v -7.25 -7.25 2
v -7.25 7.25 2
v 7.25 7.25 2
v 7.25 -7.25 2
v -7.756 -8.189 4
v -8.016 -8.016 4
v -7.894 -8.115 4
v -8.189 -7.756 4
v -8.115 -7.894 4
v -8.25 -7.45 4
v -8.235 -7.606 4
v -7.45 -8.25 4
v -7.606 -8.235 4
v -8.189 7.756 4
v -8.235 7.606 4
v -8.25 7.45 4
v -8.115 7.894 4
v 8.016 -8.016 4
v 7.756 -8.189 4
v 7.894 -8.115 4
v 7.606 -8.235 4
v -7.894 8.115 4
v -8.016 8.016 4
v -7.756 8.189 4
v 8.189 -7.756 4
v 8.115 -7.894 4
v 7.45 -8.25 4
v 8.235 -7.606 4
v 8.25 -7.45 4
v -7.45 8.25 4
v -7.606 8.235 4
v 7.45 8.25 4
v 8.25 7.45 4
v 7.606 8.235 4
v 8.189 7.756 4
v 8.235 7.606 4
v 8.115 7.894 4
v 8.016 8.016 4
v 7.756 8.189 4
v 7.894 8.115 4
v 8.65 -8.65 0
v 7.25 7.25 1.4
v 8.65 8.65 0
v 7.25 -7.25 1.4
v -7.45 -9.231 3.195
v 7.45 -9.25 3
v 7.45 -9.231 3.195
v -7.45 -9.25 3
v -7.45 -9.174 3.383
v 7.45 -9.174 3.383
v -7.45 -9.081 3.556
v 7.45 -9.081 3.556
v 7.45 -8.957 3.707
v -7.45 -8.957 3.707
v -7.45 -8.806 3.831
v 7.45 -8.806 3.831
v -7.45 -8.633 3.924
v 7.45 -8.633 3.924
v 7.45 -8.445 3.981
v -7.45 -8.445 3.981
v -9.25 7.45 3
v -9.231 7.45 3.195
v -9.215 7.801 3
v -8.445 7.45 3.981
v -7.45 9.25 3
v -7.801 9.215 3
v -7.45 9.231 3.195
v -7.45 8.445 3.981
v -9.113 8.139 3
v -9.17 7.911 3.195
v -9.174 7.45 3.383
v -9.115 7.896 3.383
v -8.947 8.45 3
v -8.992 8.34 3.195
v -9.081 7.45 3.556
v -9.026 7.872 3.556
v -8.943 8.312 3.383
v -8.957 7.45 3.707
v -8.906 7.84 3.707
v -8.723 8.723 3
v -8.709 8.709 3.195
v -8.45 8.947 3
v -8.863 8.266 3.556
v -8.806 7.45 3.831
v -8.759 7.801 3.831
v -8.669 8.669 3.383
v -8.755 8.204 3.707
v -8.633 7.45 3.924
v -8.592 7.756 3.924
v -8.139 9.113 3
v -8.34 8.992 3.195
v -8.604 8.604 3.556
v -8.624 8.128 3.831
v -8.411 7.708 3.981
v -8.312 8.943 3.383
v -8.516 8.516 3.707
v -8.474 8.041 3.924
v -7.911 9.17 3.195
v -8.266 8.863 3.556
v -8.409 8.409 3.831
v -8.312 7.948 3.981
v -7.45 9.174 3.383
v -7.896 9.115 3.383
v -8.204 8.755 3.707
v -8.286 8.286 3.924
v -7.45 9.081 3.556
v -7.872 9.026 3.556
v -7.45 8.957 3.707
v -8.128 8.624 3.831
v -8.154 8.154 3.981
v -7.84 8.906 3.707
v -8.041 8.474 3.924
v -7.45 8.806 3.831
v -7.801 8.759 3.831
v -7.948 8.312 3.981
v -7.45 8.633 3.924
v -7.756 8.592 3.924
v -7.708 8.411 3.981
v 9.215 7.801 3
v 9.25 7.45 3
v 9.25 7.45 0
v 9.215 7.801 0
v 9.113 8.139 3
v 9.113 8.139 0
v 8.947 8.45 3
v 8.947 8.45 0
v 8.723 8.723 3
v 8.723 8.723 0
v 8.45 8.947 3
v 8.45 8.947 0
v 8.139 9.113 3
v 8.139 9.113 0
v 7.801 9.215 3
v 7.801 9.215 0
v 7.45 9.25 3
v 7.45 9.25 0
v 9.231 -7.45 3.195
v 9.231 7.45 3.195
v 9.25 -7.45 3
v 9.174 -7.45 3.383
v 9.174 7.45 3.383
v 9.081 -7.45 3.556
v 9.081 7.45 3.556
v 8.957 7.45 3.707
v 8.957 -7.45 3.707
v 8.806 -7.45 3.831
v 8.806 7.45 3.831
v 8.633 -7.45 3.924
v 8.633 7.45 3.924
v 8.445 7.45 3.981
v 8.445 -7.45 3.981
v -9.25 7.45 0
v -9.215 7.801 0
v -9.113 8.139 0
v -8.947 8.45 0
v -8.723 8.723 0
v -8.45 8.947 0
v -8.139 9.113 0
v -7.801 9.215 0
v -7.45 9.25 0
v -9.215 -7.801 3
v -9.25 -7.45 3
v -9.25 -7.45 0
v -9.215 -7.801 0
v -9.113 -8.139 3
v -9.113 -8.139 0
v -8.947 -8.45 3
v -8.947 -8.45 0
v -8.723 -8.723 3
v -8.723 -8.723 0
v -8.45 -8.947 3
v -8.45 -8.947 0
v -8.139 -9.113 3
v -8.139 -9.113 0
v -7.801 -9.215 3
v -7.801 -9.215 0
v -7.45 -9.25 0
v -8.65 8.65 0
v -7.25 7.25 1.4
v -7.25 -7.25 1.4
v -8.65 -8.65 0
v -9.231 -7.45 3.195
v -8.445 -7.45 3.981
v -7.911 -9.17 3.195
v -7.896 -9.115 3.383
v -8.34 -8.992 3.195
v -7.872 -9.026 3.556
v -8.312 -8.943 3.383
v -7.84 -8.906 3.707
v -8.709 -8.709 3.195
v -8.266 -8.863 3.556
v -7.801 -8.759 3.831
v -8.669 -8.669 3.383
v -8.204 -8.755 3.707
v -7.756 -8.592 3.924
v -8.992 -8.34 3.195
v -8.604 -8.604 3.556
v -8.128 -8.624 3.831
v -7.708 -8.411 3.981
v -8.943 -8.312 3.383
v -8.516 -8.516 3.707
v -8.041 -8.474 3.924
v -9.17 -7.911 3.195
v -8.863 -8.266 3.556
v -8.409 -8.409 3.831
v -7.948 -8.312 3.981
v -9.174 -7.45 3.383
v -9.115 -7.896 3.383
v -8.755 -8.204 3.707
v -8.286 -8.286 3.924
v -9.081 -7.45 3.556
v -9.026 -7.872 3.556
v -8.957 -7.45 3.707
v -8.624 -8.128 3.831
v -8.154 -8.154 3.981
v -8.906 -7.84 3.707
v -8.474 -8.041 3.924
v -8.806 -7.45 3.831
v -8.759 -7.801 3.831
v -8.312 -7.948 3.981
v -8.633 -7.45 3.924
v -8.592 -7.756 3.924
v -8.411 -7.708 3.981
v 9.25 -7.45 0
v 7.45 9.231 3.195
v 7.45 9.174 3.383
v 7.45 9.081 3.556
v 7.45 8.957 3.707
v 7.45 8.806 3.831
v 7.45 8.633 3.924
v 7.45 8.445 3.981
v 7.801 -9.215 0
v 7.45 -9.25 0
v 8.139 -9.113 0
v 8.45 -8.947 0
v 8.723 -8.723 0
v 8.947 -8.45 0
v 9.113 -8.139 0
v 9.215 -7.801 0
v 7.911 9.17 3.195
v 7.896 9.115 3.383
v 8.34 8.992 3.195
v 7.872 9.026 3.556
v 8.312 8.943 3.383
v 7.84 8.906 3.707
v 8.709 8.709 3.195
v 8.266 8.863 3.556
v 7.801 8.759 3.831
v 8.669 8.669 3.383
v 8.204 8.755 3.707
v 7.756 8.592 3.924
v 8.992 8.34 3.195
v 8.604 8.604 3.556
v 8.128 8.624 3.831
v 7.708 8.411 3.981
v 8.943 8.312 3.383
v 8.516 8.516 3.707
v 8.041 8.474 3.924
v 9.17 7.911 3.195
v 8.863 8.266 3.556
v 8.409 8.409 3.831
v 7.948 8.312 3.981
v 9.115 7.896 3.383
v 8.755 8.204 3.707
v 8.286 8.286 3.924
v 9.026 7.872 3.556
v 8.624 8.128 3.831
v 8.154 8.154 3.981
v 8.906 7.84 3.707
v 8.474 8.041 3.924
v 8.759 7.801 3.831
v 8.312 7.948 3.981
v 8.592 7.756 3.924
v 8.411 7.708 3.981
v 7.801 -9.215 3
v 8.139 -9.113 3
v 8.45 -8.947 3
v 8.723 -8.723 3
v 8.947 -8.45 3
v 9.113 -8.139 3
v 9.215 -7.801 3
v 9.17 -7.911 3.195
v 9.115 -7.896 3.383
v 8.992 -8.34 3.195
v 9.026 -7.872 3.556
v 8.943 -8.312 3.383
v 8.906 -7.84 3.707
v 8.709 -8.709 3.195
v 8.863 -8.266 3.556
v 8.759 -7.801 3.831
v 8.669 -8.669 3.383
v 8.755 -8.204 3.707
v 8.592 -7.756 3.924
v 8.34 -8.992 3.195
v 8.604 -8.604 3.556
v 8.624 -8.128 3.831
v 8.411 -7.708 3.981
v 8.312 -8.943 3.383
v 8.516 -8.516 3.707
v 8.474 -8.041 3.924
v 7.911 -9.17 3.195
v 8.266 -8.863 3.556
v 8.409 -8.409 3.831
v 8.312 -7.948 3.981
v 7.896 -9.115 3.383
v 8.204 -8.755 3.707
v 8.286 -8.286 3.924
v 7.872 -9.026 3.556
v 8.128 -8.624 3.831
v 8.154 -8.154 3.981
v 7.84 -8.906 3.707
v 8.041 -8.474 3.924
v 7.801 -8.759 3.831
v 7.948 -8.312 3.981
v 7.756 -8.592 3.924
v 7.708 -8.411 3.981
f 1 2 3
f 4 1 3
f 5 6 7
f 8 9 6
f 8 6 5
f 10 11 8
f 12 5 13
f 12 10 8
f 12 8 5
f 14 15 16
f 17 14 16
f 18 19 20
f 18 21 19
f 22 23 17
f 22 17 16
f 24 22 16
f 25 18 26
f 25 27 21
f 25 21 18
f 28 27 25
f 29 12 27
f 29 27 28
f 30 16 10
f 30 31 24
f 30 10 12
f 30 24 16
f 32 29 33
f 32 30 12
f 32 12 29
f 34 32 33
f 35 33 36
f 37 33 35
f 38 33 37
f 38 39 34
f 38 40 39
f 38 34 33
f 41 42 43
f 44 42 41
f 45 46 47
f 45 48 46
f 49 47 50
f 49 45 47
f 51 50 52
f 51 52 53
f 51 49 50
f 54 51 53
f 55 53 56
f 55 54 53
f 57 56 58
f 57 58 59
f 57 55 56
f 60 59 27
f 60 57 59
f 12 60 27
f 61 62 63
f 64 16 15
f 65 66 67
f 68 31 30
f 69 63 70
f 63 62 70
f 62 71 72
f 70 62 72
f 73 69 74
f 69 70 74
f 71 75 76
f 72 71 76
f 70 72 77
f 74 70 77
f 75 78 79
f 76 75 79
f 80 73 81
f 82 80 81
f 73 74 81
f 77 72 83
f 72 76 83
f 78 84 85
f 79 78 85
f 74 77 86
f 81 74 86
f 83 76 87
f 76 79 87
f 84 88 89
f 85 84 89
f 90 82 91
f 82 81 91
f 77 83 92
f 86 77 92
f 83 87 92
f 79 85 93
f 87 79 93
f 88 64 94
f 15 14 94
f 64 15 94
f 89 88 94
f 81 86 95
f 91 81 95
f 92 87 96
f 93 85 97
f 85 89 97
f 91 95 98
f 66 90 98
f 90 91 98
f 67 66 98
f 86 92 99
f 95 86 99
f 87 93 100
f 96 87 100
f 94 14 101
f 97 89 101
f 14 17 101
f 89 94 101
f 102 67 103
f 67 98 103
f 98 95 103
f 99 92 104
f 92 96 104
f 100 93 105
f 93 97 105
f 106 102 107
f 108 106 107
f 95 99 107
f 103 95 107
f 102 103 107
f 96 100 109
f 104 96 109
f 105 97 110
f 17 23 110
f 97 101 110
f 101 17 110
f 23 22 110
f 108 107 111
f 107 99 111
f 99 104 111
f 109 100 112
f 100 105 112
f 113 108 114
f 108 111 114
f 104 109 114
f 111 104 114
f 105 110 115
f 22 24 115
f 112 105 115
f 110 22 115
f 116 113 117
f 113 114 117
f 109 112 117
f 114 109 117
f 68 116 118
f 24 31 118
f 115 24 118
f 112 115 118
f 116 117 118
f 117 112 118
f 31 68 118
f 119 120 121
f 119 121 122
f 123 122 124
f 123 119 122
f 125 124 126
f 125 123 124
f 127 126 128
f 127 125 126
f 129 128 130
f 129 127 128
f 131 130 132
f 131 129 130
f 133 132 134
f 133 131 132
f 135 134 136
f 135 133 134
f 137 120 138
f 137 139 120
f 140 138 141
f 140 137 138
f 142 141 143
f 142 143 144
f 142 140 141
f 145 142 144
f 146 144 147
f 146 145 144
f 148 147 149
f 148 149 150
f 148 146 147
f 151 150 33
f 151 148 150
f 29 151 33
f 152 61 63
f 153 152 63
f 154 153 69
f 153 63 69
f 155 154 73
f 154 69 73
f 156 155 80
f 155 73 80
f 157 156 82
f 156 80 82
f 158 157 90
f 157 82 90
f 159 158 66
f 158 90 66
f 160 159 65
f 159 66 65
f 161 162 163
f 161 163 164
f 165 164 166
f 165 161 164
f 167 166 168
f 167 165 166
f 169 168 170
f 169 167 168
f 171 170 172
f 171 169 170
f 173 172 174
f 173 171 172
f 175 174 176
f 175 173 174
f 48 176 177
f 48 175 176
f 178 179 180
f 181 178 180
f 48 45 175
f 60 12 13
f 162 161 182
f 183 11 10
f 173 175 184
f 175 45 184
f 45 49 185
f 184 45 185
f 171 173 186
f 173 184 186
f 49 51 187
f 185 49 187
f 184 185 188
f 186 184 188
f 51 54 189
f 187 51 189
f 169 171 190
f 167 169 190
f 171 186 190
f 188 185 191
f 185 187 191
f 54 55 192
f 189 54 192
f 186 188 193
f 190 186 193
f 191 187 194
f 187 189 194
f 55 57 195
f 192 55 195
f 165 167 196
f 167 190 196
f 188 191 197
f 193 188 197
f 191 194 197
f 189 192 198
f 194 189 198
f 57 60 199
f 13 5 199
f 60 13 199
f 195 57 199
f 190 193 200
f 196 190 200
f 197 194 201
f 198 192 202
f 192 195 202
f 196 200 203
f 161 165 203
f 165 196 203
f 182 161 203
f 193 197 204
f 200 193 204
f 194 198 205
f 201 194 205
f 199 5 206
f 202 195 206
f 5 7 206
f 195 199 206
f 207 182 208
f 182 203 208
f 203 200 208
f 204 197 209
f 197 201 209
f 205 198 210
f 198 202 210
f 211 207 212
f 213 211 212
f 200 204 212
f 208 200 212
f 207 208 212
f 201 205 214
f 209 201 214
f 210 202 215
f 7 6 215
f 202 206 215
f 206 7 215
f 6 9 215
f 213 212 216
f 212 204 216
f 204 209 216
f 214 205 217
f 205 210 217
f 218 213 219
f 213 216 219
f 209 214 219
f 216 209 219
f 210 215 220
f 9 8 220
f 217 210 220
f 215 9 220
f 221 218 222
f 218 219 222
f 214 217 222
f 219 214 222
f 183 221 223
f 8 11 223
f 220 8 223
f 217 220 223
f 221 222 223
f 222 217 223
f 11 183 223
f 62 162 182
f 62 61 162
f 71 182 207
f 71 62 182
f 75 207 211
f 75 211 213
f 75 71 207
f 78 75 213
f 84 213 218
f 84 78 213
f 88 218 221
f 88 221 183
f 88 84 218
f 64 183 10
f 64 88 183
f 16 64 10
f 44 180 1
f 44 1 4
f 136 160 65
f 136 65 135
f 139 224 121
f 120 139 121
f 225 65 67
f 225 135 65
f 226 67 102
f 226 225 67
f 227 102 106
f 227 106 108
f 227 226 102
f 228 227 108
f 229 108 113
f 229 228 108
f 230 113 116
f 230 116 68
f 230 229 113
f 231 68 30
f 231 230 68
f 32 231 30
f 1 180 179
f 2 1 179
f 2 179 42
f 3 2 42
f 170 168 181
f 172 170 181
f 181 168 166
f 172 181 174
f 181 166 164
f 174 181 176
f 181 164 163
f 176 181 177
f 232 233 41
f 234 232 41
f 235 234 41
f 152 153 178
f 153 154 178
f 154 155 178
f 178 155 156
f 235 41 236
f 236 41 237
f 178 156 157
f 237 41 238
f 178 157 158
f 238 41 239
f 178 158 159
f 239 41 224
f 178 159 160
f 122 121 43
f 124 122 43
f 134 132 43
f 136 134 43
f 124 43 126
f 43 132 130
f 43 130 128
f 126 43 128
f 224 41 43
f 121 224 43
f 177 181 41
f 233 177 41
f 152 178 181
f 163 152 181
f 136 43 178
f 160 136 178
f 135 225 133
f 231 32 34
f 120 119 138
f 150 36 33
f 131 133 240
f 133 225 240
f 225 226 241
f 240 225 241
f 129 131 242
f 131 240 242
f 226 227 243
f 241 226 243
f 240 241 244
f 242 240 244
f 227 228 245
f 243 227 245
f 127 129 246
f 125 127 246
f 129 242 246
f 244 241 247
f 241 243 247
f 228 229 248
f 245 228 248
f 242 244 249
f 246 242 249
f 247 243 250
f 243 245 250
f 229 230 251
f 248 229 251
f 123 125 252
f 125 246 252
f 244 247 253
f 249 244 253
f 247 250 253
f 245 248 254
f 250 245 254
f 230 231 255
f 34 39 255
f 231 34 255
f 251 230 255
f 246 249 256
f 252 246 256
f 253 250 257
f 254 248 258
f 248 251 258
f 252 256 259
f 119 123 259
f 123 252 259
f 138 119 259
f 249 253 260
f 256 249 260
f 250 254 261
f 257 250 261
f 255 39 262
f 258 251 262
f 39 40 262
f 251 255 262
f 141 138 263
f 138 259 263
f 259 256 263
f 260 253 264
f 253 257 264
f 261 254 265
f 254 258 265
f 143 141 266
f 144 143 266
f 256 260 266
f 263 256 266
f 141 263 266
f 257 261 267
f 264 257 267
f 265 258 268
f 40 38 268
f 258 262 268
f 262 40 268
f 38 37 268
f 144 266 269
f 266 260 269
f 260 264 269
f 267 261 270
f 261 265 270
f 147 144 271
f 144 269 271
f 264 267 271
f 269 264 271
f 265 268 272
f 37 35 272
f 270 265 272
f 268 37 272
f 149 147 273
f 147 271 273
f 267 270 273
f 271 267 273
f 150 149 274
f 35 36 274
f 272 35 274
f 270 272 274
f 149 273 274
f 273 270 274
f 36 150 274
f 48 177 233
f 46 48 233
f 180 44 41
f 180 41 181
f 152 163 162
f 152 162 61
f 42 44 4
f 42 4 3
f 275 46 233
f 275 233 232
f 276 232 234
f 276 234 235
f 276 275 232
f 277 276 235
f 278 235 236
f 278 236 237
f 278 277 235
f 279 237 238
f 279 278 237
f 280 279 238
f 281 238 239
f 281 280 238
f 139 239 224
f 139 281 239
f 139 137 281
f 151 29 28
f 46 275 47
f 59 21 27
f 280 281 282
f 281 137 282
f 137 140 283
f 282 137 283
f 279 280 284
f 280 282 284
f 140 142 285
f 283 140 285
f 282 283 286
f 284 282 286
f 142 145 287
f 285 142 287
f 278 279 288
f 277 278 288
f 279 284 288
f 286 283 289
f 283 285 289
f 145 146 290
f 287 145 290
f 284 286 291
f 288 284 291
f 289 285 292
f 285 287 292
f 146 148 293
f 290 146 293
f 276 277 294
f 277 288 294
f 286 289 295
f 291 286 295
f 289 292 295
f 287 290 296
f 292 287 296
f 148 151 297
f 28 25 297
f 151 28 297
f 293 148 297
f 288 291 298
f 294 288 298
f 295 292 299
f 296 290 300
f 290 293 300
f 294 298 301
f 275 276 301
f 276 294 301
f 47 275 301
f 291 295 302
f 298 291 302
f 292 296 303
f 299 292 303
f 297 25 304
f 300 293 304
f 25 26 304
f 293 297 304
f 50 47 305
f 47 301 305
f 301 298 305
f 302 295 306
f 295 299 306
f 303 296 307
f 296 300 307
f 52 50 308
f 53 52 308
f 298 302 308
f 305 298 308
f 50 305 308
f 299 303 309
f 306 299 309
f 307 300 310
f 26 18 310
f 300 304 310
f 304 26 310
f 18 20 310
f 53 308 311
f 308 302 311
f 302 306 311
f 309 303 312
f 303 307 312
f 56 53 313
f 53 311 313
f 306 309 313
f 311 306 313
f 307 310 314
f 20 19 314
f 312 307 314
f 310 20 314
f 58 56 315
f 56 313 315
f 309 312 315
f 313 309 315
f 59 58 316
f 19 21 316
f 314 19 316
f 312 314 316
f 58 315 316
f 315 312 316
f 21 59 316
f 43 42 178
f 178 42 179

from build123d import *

# Parameters (mm, degrees)
SCHIZZO1_W                   = 18.5
SCHIZZO1_H                   = 18.5
ESTRUSIONE_ESTRUSIONE1_DEPTH = 4
RACCORDO1_R                  = 1.8
RACCORDO2_R                  = 1
SVUOTA1_T                    = -2
SMUSSO1_SIZE                 = 1.4


with BuildPart() as part:
    # Schizzo1 → Estrusione-Estrusione1 (new body)
    with BuildSketch(Plane.XY):
        Rectangle(SCHIZZO1_W, SCHIZZO1_H)
    extrude(amount=ESTRUSIONE_ESTRUSIONE1_DEPTH)

    # Raccordo1
    raccordo1_edges = [part.edges().sort_by_distance(p)[0] for p in [
        (9.25, -9.25, 2),
        (-9.25, -9.25, 2),
        (-9.25, 9.25, 2),
        (9.25, 9.25, 2),
    ]]
    fillet(raccordo1_edges, radius=RACCORDO1_R)

    # Raccordo2
    raccordo2_edges = [part.edges().sort_by_distance(p)[0] for p in [
        (-9.25, 0, 4),
        (0, 9.25, 4),
        (9.25, 0, 4),
        (0, -9.25, 4),
        (8.722792206, 8.722792206, 4),
        (8.722792206, -8.722792206, 4),
        (-8.722792206, -8.722792206, 4),
        (-8.722792206, 8.722792206, 4),
    ]]
    fillet(raccordo2_edges, radius=RACCORDO2_R)

    # Svuota1
    svuota1_openings = [part.faces().sort_by_distance(p)[0] for p in [
        (0, 0, 0),
    ]]
    offset(amount=SVUOTA1_T, openings=svuota1_openings, kind=Kind.INTERSECTION)

    # Smusso1
    smusso1_edges = [part.edges().sort_by_distance(p)[0] for p in [
        (7.25, 0, 0),
        (0, 7.25, 0),
        (-7.25, 0, 0),
        (0, -7.25, 0),
    ]]
    chamfer(smusso1_edges, length=SMUSSO1_SIZE)


solid = part.part
